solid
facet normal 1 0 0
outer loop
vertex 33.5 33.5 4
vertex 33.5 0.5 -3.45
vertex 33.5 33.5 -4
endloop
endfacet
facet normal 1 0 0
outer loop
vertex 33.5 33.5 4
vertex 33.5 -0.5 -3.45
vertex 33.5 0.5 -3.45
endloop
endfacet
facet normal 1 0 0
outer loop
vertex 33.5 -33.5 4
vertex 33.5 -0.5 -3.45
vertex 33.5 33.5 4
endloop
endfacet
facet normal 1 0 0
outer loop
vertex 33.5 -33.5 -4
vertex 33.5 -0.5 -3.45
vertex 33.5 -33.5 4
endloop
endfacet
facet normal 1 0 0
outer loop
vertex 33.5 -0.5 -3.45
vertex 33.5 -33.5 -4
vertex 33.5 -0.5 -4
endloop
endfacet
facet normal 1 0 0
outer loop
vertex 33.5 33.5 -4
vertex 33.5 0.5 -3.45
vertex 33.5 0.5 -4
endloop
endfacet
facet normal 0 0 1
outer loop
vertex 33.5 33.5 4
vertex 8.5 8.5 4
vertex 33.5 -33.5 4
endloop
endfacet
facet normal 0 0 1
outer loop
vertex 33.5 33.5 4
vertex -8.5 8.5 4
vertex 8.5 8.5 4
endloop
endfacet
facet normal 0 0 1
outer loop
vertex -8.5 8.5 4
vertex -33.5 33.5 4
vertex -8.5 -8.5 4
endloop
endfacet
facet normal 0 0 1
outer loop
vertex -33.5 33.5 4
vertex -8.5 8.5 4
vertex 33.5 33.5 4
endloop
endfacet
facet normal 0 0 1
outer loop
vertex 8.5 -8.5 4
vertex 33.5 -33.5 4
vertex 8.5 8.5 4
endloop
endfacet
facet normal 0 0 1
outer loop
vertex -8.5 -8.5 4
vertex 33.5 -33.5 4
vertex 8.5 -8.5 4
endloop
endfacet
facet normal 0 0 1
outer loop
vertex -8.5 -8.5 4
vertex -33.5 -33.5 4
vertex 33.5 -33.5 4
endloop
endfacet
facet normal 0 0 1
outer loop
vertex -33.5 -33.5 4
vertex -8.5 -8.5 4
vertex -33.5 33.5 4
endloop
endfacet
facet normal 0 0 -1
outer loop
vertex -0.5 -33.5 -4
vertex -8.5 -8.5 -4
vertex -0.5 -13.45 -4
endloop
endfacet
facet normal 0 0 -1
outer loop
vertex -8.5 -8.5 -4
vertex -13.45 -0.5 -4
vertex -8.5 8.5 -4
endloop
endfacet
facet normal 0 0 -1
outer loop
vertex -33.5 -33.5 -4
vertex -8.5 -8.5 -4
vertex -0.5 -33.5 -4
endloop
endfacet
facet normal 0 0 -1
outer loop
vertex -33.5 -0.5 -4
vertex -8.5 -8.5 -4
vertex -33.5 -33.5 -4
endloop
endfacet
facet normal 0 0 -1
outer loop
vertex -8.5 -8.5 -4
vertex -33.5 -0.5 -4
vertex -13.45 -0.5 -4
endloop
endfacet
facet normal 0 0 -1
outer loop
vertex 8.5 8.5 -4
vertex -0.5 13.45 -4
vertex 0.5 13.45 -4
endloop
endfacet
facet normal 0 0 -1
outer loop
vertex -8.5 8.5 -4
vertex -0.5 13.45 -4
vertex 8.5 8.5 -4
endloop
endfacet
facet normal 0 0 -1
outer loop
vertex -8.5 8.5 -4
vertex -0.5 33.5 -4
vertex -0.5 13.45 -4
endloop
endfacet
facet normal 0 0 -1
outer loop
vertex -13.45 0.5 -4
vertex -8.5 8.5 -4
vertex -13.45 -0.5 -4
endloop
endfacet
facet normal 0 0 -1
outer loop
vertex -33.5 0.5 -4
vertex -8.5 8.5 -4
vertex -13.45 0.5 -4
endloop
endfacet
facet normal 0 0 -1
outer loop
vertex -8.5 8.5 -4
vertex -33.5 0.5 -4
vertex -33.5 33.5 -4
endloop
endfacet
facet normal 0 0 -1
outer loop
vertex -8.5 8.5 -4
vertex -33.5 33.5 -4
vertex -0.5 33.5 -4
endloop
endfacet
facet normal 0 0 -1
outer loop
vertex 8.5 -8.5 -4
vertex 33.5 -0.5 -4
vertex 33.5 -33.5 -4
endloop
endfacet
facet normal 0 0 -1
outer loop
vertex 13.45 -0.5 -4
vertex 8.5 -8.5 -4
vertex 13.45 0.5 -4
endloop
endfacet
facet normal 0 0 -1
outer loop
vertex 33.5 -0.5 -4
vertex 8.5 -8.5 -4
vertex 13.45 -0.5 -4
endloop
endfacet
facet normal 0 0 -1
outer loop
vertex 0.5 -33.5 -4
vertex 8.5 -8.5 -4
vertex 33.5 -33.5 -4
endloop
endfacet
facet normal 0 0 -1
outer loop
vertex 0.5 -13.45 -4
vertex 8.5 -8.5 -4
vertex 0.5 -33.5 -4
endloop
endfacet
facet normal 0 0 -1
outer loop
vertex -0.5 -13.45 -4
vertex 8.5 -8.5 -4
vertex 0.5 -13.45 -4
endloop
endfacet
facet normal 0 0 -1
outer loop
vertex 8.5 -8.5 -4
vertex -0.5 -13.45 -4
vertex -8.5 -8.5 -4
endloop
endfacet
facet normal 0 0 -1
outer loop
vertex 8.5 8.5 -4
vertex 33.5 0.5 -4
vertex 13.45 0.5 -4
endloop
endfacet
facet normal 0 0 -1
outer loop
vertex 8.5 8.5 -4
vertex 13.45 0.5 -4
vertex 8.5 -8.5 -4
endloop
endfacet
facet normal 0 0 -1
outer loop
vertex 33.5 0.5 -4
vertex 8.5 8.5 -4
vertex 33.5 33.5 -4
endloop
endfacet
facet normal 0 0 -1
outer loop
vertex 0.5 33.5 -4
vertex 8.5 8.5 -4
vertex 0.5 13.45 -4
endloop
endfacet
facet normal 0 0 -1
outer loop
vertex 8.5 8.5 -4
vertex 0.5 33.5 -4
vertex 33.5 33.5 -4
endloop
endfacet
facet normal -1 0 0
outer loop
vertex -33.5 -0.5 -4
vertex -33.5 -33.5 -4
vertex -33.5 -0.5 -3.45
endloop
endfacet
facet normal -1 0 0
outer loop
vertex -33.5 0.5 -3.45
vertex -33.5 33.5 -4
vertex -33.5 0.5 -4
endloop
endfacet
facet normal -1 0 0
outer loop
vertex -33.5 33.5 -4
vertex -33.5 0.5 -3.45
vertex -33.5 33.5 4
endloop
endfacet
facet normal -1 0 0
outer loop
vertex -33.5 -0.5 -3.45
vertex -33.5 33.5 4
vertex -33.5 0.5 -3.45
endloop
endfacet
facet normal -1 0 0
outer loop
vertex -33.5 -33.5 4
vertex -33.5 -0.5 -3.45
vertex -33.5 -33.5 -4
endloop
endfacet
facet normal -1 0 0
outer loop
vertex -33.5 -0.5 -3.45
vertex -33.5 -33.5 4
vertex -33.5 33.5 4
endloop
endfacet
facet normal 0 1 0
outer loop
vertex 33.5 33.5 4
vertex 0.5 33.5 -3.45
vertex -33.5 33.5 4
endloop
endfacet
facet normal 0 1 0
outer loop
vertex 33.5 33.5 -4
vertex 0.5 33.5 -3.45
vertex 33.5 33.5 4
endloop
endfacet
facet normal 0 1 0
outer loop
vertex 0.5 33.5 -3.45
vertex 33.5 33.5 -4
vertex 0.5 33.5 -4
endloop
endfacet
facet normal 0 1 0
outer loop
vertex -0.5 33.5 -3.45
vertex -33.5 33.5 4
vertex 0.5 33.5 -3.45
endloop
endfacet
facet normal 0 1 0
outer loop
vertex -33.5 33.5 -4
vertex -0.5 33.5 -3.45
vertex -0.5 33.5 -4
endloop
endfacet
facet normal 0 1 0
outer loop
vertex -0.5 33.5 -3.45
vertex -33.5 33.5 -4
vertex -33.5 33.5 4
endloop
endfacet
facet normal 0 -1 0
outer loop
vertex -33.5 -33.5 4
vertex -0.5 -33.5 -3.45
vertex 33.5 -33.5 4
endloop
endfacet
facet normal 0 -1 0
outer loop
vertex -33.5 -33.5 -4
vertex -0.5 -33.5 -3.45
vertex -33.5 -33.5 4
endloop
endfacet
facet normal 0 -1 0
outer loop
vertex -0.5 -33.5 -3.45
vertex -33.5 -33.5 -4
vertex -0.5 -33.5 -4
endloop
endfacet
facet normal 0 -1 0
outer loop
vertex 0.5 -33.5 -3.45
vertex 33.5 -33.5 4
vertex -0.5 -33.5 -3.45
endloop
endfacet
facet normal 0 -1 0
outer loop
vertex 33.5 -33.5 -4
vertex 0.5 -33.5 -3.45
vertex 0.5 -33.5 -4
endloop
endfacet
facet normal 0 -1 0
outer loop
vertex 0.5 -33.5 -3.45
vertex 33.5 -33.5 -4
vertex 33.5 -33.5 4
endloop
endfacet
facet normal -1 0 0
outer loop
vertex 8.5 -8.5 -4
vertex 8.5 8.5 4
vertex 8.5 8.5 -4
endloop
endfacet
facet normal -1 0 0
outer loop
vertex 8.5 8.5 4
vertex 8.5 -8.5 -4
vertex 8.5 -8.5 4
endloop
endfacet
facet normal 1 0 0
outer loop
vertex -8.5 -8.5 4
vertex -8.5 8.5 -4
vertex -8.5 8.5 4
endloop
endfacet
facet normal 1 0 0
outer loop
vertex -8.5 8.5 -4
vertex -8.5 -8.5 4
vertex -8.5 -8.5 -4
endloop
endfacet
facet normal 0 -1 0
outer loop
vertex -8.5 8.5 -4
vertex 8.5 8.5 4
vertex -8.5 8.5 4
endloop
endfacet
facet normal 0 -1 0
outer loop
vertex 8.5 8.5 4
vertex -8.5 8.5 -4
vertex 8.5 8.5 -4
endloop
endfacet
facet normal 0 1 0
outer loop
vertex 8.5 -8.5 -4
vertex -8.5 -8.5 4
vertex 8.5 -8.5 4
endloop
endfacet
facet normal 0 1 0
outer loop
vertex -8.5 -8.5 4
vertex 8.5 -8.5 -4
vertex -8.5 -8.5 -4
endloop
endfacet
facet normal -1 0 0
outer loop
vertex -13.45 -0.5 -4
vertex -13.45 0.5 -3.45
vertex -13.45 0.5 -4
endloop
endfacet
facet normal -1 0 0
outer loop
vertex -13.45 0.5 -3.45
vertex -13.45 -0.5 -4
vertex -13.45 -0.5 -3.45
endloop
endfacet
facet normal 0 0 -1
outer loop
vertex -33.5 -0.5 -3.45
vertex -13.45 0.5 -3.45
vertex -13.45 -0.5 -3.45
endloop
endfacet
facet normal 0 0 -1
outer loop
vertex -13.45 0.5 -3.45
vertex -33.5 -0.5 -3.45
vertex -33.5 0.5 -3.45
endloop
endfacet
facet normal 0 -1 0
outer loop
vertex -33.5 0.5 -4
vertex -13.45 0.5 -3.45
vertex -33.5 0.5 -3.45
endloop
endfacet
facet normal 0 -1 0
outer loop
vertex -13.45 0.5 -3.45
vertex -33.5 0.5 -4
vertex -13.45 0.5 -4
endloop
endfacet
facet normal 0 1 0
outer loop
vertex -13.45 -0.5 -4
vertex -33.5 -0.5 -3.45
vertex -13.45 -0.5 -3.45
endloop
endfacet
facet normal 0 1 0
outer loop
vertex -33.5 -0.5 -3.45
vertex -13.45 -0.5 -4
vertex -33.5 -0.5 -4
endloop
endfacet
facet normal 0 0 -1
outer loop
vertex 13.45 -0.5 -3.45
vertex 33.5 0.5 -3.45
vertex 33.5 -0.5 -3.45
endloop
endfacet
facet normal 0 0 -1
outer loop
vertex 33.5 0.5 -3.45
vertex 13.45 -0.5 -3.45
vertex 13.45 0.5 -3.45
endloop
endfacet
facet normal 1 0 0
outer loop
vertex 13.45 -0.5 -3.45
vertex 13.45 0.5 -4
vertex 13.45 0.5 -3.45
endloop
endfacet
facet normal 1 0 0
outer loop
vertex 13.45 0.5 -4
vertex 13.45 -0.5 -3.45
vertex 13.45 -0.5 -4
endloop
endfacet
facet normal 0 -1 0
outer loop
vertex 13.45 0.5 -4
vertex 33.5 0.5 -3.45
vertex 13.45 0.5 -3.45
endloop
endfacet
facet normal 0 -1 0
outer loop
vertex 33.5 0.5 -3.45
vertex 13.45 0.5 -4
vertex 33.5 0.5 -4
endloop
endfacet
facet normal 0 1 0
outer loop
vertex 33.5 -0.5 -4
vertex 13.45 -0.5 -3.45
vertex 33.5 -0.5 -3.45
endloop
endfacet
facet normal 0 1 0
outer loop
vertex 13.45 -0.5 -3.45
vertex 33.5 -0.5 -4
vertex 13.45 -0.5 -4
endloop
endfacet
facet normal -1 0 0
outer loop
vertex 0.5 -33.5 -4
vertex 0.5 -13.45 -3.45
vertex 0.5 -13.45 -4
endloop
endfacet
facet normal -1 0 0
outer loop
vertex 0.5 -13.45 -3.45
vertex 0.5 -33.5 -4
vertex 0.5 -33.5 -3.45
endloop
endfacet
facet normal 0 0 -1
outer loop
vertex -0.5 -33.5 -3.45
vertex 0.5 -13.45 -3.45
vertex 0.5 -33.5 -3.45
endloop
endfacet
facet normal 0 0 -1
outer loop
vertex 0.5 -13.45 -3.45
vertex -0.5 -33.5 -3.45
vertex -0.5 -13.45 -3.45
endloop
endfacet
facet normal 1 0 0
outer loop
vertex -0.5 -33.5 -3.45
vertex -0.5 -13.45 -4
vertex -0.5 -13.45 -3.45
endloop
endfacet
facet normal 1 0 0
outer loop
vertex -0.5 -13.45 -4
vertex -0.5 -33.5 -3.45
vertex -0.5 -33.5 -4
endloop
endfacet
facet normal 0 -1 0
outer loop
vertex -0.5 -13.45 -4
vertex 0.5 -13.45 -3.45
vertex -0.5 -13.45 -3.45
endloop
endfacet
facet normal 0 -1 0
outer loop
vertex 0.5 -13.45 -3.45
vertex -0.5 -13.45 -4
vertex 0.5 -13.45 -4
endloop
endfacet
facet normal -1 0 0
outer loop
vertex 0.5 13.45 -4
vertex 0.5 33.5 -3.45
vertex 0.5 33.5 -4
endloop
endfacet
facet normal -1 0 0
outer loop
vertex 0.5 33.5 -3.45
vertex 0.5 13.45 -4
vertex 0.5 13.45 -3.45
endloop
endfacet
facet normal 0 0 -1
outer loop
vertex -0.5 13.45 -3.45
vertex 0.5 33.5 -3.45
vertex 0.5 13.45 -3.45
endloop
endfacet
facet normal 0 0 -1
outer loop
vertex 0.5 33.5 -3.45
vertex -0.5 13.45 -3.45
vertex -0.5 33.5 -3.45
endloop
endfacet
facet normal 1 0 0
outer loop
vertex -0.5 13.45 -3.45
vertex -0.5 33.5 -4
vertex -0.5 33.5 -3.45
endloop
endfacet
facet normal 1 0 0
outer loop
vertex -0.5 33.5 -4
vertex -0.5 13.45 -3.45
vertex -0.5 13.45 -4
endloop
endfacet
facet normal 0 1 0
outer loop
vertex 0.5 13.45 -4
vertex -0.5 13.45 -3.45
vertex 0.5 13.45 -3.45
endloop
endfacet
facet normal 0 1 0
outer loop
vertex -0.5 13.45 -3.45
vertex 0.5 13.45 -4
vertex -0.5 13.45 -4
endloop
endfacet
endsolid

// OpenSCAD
// =========================================================================
// Wielkoformatowy Zegar Cyfrowy LED - Szablon Frezarski Dwukropka (V26)
// =========================================================================
// Parametryczny szablon do frezowania otworów pilotujących dwukropka w MDF
// przy użyciu pierścienia kopiującego (Ø 17 mm) oraz frezu palcowego (Ø 8 mm).
// Offset wbudowany = (17 - 8) / 2 = 4.5 mm na stronę.
// =========================================================================

/* [Wybór Szablonu] */
// Typ szablonu dwukropka: "large" (wynik, 12x12mm dno) lub "small" (zegar, 8x8mm dno)
template_type = "small"; // [large, small]

/* [Parametry Narzędzia] */
guide_bush_d = 17; // Średnica pierścienia kopiującego (mm)
cutter_d = 8;      // Średnica frezu palcowego (mm)
tool_offset = (guide_bush_d - cutter_d) / 2; // Offset jednostronny (4.5 mm)

/* [Wymiary Bazy (MDF)] */
// Otwór pilotujący w MDF (dno)
pilot_size = (template_type == "large") ? 12 : 8;

/* [Wymiary Szablonu] */
margin = 25;        // Margines wokół otworu roboczego (mm)
thickness = 8;      // Grubość szablonu (mm)

// Obliczenie otworu wewnętrznego w szablonie (w którym porusza się pierścień)
inner_size = pilot_size + 2 * tool_offset; // Dla dużego: 21 mm, dla małego: 17 mm

// Bounding box szablonu
outer_w = inner_size + 2 * margin;
outer_h = inner_size + 2 * margin;

// Wymiary nacięć celowniczych (krzyży pomocniczych)
cross_depth = 0.5;   // Głębokość nacięcia (mm)
cross_width = 1.0;   // Szerokość linii nacięcia (mm)
cross_length = 20;   // Długość linii od krawędzi zewnętrznej (mm)

module template_body() {
    difference() {
        // Główna płyta szablonu
        cube([outer_w, outer_h, thickness], center = true);
        
        // Otwór roboczy pod pierścień kopiujący
        cube([inner_size, inner_size, thickness + 2], center = true);
        
        // Krzyże celownicze na dolnej powierzchni (z = -thickness/2)
        // Lewy krzyż celowniczy (oś X, strona lewa)
        translate([-outer_w/2 + cross_length/2, 0, -thickness/2 + cross_depth/2])
            cube([cross_length + 0.1, cross_width, cross_depth + 0.1], center = true);
            
        // Prawy krzyż celowniczy (oś X, strona prawa)
        translate([outer_w/2 - cross_length/2, 0, -thickness/2 + cross_depth/2])
            cube([cross_length + 0.1, cross_width, cross_depth + 0.1], center = true);
            
        // Dolny krzyż celowniczy (oś Y, strona dolna)
        translate([0, -outer_h/2 + cross_length/2, -thickness/2 + cross_depth/2])
            cube([cross_width, cross_length + 0.1, cross_depth + 0.1], center = true);
            
        // Górny krzyż celowniczy (oś Y, strona górna)
        translate([0, outer_h/2 - cross_length/2, -thickness/2 + cross_depth/2])
            cube([cross_width, cross_length + 0.1, cross_depth + 0.1], center = true);
    }
}

// Renderowanie szablonu
template_body();

// Informacje pomocnicze w konsoli OpenSCAD
echo("=================================================");
echo("ROZMIAR SZABLONU DWUKROPKA:", template_type);
echo("Wymiar zewnętrzny płyty:", outer_w, "x", outer_h, "mm");
echo("Otwór wewnętrzny (roboczy):", inner_size, "x", inner_size, "mm");
echo("Docelowy otwór pilotujący w MDF:", pilot_size, "x", pilot_size, "mm");
echo("Oczekiwany wymiar na froncie po fazowaniu 45° na głębokość 9mm:", pilot_size + 18, "x", pilot_size + 18, "mm");
echo("=================================================");
